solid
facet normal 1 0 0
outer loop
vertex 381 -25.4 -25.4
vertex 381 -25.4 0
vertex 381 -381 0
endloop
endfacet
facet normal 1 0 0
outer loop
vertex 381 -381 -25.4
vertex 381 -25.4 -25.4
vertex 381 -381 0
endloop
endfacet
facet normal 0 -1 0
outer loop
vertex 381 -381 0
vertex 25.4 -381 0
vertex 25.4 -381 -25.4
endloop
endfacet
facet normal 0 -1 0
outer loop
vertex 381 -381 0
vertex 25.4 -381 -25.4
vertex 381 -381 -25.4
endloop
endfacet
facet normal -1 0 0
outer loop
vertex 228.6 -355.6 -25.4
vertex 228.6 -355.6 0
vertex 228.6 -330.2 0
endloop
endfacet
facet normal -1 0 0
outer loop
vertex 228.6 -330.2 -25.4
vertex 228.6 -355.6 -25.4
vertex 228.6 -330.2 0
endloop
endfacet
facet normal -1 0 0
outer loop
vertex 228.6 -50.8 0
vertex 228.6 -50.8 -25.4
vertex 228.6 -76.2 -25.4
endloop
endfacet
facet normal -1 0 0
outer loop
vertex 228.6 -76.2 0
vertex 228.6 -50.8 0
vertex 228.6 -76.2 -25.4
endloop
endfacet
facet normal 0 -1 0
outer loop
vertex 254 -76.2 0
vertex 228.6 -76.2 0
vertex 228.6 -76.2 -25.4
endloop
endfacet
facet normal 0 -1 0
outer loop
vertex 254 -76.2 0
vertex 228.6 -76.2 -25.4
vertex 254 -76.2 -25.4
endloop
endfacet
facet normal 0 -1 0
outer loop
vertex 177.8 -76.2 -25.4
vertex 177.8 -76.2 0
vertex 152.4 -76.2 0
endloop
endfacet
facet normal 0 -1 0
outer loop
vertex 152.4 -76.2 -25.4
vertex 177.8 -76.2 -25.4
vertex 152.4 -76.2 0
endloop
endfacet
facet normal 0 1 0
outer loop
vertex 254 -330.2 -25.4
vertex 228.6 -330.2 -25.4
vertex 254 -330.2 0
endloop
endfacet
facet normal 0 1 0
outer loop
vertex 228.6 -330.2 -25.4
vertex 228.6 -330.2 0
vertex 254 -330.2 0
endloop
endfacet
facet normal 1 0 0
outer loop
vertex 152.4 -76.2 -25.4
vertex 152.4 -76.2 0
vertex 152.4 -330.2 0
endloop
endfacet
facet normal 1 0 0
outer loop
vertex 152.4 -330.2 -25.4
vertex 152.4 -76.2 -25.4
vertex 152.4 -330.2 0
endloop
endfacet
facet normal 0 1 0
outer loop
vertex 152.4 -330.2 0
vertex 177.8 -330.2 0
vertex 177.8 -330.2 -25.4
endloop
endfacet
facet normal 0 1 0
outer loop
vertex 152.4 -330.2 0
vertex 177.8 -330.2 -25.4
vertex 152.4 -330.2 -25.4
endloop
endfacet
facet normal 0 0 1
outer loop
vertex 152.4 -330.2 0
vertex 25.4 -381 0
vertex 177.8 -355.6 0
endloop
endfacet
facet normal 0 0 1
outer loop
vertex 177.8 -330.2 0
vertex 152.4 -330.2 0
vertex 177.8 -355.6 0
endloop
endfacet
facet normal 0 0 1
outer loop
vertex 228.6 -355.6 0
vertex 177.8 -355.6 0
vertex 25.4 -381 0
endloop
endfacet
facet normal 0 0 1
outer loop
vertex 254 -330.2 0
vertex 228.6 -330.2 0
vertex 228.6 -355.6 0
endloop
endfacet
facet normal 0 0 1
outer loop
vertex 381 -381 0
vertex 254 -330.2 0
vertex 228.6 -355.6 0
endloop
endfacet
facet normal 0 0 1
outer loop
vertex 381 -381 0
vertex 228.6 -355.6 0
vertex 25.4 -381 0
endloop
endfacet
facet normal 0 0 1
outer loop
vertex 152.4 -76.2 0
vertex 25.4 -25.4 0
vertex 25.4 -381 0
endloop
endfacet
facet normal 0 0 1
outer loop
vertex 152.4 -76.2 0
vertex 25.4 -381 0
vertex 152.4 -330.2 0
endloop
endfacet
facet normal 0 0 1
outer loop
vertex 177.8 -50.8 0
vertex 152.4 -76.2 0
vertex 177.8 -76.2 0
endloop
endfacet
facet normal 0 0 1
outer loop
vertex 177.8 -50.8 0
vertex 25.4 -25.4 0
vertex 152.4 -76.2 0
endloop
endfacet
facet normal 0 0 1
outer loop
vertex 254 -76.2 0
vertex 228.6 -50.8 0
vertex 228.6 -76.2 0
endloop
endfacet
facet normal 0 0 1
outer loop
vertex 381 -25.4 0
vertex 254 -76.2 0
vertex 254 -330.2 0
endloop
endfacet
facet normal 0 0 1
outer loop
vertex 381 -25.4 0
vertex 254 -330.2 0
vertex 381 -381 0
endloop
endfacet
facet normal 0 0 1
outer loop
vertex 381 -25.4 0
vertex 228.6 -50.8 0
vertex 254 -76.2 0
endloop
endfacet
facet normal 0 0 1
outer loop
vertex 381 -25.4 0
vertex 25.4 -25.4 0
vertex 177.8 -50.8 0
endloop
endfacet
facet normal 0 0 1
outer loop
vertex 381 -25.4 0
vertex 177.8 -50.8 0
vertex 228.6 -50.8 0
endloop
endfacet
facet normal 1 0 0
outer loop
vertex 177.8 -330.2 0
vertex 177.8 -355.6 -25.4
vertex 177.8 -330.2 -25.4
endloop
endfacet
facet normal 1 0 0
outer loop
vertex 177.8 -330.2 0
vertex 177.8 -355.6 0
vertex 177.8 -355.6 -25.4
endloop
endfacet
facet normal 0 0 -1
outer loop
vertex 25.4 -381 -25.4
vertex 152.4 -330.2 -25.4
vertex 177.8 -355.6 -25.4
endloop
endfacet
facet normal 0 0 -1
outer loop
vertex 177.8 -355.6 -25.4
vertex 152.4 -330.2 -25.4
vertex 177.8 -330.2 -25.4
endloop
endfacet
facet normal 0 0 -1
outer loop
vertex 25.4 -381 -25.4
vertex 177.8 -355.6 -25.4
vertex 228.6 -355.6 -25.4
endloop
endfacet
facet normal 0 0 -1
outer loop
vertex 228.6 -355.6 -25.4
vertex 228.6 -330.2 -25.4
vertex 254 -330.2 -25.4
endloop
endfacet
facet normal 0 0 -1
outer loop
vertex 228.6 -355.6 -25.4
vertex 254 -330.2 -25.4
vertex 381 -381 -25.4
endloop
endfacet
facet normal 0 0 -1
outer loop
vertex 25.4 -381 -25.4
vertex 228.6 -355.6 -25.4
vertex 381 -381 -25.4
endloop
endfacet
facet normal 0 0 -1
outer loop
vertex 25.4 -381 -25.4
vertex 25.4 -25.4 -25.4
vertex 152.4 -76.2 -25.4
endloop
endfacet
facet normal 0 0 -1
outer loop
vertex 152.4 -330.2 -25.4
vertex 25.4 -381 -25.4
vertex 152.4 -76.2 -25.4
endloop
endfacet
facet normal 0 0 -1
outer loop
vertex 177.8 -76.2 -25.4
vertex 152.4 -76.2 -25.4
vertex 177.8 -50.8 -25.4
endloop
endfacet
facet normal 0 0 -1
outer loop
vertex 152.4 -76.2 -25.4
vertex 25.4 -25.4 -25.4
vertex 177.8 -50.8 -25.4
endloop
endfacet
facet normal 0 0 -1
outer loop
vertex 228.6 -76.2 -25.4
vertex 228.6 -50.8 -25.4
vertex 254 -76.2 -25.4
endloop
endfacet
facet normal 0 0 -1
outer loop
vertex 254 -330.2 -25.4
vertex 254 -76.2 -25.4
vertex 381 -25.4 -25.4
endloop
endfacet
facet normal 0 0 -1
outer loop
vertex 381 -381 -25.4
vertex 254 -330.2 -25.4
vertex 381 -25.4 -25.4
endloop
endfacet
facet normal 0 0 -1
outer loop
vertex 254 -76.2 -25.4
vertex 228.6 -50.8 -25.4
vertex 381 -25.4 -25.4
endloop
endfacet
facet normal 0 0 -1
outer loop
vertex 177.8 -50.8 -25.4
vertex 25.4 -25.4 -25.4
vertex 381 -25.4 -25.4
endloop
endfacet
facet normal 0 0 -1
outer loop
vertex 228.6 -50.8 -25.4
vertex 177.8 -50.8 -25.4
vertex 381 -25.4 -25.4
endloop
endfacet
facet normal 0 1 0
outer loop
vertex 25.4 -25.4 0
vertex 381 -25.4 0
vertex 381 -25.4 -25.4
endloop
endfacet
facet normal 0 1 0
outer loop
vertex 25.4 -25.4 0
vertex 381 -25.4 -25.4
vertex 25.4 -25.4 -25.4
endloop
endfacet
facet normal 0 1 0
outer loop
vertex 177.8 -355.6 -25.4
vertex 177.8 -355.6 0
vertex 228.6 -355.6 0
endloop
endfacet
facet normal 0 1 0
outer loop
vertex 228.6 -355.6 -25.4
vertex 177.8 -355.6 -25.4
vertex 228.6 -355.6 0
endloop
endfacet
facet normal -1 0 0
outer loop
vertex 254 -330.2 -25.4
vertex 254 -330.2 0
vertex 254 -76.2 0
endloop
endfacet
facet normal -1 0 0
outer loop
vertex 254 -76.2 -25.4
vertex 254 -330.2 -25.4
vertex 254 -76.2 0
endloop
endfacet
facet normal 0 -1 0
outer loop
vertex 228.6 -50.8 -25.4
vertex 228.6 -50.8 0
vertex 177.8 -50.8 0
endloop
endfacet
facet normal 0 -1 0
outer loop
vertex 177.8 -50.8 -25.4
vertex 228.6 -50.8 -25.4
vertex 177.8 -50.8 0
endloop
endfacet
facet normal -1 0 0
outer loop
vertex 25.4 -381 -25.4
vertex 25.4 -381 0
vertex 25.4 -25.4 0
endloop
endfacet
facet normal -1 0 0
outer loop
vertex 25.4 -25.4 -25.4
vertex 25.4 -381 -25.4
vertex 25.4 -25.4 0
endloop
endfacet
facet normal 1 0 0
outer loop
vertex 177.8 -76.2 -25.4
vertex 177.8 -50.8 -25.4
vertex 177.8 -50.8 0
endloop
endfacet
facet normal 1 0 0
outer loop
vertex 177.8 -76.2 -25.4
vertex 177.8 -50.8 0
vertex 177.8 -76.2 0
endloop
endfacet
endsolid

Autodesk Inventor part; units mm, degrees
ref_plane "YZ Plane" through (0, 0, 0) normal (1, 0, 0) x (0, 1, 0)
ref_plane "XZ Plane" through (0, 0, 0) normal (0, 1, 0) x (-1, 0, 0)
ref_plane "XY Plane" through (0, 0, 0) normal (0, 0, 1) x (1, 0, 0)
sketch "Sketch1" plane through (0, 0, 0) normal (0, 0, 1) x (1, 0, 0)
  line L0 (0, 0) -> (812.8, 0) construction
  line L1 (812.8, 0) -> (812.8, -406.4) construction
  line L2 (812.8, -406.4) -> (0, -406.4) construction
  line L3 (0, -406.4) -> (0, 0) construction
  line L4 (0, 0) -> (406.4, 0)
  line L5 (406.4, 0) -> (406.4, -25.4)
  line L6 (406.4, -25.4) -> (0, -25.4)
  line L7 (0, -25.4) -> (0, 0)
  line L8 (406.4, -25.4) -> (381, -25.4)
  line L9 (381, -25.4) -> (381, -406.4)
  line L10 (381, -406.4) -> (406.4, -406.4)
  line L11 (406.4, -406.4) -> (406.4, -25.4)
  line L12 (381, -406.4) -> (0, -406.4)
  line L13 (0, -406.4) -> (0, -381)
  line L14 (0, -381) -> (381, -381)
  line L15 (381, -381) -> (381, -406.4)
  line L16 (0, -381) -> (25.4, -381)
  line L17 (25.4, -381) -> (25.4, -25.4)
  line L18 (25.4, -25.4) -> (0, -25.4)
  line L19 (0, -25.4) -> (0, -381)
  dimension "d1" = 812.8
  dimension "d5" = 406.4
  dimension "d6" = 25.4
  dimension "d7" = 25.4
  dimension "d8" = 381
  dimension "d9" = 381
  dimension "d10" = 25.4
  dimension "d11" = 25.4
extrude "Extrusion1" add sketch "Sketch1" against normal blind 25.4 contours L6 L9 L14 L17
sketch "Sketch3" plane through (0, 0, 0) normal (0, 0, 1) x (1, 0, 0)
  line L0 (-406.4, 0) -> (406.4, 0) construction
  line L1 (406.4, 0) -> (406.4, -406.4) construction
  line L2 (406.4, -406.4) -> (-406.4, -406.4) construction
  line L3 (-406.4, -406.4) -> (-406.4, 0) construction
  line L4 (406.4, 0) -> (406.4, -406.4)
  line L5 (381, -381) -> (25.4, -381) projected
  line L6 (203.2, -381) -> (203.2, -355.6)
  line L7 (203.2, -355.6) -> (254, -355.6)
  line L8 (254, -355.6) -> (254, -50.8)
  line L9 (254, -50.8) -> (152.4, -50.8)
  line L10 (152.4, -50.8) -> (152.4, -355.6)
  line L11 (152.4, -355.6) -> (203.2, -355.6)
  point P0 (0, 0)
  dimension "d36" = 812.8
  dimension "d45" = 25.4
  dimension "d46" = 50.8
  dimension "d47" = 304.8
  dimension "d48" = 101.6
extrude "Extrusion3" cut sketch "Sketch3" against normal blind 25.4
sketch "Sketch4" plane through (0, 0, 0) normal (0, 0, 1) x (1, 0, 0)
  line L0 (254, -50.8) -> (152.4, -50.8) projected
  line L1 (152.4, -50.8) -> (177.8, -50.8)
  line L2 (177.8, -50.8) -> (177.8, -76.2)
  line L3 (177.8, -76.2) -> (152.4, -76.2)
  line L4 (152.4, -76.2) -> (152.4, -50.8)
  line L5 (254, -50.8) -> (228.6, -50.8)
  line L6 (228.6, -50.8) -> (228.6, -76.2)
  line L7 (228.6, -76.2) -> (254, -76.2)
  line L8 (254, -76.2) -> (254, -50.8)
  line L9 (152.4, -355.6) -> (254, -355.6) projected
  line L10 (152.4, -355.6) -> (177.8, -355.6)
  line L11 (177.8, -355.6) -> (177.8, -330.2)
  line L12 (177.8, -330.2) -> (152.4, -330.2)
  line L13 (152.4, -330.2) -> (152.4, -355.6)
  line L14 (254, -355.6) -> (228.6, -355.6)
  line L15 (228.6, -355.6) -> (228.6, -330.2)
  line L16 (228.6, -330.2) -> (254, -330.2)
  line L17 (254, -330.2) -> (254, -355.6)
  point P0 (0, 0)
  dimension "d51" = 25.4
  dimension "d52" = 25.4
  dimension "d53" = 25.4
  dimension "d54" = 25.4
  dimension "d55" = 25.4
  dimension "d56" = 25.4
  dimension "d57" = 25.4
  dimension "d58" = 25.4
extrude "Extrusion4" add sketch "Sketch4" against normal blind 25.4
properties part number "JukeBox Top Panel"
